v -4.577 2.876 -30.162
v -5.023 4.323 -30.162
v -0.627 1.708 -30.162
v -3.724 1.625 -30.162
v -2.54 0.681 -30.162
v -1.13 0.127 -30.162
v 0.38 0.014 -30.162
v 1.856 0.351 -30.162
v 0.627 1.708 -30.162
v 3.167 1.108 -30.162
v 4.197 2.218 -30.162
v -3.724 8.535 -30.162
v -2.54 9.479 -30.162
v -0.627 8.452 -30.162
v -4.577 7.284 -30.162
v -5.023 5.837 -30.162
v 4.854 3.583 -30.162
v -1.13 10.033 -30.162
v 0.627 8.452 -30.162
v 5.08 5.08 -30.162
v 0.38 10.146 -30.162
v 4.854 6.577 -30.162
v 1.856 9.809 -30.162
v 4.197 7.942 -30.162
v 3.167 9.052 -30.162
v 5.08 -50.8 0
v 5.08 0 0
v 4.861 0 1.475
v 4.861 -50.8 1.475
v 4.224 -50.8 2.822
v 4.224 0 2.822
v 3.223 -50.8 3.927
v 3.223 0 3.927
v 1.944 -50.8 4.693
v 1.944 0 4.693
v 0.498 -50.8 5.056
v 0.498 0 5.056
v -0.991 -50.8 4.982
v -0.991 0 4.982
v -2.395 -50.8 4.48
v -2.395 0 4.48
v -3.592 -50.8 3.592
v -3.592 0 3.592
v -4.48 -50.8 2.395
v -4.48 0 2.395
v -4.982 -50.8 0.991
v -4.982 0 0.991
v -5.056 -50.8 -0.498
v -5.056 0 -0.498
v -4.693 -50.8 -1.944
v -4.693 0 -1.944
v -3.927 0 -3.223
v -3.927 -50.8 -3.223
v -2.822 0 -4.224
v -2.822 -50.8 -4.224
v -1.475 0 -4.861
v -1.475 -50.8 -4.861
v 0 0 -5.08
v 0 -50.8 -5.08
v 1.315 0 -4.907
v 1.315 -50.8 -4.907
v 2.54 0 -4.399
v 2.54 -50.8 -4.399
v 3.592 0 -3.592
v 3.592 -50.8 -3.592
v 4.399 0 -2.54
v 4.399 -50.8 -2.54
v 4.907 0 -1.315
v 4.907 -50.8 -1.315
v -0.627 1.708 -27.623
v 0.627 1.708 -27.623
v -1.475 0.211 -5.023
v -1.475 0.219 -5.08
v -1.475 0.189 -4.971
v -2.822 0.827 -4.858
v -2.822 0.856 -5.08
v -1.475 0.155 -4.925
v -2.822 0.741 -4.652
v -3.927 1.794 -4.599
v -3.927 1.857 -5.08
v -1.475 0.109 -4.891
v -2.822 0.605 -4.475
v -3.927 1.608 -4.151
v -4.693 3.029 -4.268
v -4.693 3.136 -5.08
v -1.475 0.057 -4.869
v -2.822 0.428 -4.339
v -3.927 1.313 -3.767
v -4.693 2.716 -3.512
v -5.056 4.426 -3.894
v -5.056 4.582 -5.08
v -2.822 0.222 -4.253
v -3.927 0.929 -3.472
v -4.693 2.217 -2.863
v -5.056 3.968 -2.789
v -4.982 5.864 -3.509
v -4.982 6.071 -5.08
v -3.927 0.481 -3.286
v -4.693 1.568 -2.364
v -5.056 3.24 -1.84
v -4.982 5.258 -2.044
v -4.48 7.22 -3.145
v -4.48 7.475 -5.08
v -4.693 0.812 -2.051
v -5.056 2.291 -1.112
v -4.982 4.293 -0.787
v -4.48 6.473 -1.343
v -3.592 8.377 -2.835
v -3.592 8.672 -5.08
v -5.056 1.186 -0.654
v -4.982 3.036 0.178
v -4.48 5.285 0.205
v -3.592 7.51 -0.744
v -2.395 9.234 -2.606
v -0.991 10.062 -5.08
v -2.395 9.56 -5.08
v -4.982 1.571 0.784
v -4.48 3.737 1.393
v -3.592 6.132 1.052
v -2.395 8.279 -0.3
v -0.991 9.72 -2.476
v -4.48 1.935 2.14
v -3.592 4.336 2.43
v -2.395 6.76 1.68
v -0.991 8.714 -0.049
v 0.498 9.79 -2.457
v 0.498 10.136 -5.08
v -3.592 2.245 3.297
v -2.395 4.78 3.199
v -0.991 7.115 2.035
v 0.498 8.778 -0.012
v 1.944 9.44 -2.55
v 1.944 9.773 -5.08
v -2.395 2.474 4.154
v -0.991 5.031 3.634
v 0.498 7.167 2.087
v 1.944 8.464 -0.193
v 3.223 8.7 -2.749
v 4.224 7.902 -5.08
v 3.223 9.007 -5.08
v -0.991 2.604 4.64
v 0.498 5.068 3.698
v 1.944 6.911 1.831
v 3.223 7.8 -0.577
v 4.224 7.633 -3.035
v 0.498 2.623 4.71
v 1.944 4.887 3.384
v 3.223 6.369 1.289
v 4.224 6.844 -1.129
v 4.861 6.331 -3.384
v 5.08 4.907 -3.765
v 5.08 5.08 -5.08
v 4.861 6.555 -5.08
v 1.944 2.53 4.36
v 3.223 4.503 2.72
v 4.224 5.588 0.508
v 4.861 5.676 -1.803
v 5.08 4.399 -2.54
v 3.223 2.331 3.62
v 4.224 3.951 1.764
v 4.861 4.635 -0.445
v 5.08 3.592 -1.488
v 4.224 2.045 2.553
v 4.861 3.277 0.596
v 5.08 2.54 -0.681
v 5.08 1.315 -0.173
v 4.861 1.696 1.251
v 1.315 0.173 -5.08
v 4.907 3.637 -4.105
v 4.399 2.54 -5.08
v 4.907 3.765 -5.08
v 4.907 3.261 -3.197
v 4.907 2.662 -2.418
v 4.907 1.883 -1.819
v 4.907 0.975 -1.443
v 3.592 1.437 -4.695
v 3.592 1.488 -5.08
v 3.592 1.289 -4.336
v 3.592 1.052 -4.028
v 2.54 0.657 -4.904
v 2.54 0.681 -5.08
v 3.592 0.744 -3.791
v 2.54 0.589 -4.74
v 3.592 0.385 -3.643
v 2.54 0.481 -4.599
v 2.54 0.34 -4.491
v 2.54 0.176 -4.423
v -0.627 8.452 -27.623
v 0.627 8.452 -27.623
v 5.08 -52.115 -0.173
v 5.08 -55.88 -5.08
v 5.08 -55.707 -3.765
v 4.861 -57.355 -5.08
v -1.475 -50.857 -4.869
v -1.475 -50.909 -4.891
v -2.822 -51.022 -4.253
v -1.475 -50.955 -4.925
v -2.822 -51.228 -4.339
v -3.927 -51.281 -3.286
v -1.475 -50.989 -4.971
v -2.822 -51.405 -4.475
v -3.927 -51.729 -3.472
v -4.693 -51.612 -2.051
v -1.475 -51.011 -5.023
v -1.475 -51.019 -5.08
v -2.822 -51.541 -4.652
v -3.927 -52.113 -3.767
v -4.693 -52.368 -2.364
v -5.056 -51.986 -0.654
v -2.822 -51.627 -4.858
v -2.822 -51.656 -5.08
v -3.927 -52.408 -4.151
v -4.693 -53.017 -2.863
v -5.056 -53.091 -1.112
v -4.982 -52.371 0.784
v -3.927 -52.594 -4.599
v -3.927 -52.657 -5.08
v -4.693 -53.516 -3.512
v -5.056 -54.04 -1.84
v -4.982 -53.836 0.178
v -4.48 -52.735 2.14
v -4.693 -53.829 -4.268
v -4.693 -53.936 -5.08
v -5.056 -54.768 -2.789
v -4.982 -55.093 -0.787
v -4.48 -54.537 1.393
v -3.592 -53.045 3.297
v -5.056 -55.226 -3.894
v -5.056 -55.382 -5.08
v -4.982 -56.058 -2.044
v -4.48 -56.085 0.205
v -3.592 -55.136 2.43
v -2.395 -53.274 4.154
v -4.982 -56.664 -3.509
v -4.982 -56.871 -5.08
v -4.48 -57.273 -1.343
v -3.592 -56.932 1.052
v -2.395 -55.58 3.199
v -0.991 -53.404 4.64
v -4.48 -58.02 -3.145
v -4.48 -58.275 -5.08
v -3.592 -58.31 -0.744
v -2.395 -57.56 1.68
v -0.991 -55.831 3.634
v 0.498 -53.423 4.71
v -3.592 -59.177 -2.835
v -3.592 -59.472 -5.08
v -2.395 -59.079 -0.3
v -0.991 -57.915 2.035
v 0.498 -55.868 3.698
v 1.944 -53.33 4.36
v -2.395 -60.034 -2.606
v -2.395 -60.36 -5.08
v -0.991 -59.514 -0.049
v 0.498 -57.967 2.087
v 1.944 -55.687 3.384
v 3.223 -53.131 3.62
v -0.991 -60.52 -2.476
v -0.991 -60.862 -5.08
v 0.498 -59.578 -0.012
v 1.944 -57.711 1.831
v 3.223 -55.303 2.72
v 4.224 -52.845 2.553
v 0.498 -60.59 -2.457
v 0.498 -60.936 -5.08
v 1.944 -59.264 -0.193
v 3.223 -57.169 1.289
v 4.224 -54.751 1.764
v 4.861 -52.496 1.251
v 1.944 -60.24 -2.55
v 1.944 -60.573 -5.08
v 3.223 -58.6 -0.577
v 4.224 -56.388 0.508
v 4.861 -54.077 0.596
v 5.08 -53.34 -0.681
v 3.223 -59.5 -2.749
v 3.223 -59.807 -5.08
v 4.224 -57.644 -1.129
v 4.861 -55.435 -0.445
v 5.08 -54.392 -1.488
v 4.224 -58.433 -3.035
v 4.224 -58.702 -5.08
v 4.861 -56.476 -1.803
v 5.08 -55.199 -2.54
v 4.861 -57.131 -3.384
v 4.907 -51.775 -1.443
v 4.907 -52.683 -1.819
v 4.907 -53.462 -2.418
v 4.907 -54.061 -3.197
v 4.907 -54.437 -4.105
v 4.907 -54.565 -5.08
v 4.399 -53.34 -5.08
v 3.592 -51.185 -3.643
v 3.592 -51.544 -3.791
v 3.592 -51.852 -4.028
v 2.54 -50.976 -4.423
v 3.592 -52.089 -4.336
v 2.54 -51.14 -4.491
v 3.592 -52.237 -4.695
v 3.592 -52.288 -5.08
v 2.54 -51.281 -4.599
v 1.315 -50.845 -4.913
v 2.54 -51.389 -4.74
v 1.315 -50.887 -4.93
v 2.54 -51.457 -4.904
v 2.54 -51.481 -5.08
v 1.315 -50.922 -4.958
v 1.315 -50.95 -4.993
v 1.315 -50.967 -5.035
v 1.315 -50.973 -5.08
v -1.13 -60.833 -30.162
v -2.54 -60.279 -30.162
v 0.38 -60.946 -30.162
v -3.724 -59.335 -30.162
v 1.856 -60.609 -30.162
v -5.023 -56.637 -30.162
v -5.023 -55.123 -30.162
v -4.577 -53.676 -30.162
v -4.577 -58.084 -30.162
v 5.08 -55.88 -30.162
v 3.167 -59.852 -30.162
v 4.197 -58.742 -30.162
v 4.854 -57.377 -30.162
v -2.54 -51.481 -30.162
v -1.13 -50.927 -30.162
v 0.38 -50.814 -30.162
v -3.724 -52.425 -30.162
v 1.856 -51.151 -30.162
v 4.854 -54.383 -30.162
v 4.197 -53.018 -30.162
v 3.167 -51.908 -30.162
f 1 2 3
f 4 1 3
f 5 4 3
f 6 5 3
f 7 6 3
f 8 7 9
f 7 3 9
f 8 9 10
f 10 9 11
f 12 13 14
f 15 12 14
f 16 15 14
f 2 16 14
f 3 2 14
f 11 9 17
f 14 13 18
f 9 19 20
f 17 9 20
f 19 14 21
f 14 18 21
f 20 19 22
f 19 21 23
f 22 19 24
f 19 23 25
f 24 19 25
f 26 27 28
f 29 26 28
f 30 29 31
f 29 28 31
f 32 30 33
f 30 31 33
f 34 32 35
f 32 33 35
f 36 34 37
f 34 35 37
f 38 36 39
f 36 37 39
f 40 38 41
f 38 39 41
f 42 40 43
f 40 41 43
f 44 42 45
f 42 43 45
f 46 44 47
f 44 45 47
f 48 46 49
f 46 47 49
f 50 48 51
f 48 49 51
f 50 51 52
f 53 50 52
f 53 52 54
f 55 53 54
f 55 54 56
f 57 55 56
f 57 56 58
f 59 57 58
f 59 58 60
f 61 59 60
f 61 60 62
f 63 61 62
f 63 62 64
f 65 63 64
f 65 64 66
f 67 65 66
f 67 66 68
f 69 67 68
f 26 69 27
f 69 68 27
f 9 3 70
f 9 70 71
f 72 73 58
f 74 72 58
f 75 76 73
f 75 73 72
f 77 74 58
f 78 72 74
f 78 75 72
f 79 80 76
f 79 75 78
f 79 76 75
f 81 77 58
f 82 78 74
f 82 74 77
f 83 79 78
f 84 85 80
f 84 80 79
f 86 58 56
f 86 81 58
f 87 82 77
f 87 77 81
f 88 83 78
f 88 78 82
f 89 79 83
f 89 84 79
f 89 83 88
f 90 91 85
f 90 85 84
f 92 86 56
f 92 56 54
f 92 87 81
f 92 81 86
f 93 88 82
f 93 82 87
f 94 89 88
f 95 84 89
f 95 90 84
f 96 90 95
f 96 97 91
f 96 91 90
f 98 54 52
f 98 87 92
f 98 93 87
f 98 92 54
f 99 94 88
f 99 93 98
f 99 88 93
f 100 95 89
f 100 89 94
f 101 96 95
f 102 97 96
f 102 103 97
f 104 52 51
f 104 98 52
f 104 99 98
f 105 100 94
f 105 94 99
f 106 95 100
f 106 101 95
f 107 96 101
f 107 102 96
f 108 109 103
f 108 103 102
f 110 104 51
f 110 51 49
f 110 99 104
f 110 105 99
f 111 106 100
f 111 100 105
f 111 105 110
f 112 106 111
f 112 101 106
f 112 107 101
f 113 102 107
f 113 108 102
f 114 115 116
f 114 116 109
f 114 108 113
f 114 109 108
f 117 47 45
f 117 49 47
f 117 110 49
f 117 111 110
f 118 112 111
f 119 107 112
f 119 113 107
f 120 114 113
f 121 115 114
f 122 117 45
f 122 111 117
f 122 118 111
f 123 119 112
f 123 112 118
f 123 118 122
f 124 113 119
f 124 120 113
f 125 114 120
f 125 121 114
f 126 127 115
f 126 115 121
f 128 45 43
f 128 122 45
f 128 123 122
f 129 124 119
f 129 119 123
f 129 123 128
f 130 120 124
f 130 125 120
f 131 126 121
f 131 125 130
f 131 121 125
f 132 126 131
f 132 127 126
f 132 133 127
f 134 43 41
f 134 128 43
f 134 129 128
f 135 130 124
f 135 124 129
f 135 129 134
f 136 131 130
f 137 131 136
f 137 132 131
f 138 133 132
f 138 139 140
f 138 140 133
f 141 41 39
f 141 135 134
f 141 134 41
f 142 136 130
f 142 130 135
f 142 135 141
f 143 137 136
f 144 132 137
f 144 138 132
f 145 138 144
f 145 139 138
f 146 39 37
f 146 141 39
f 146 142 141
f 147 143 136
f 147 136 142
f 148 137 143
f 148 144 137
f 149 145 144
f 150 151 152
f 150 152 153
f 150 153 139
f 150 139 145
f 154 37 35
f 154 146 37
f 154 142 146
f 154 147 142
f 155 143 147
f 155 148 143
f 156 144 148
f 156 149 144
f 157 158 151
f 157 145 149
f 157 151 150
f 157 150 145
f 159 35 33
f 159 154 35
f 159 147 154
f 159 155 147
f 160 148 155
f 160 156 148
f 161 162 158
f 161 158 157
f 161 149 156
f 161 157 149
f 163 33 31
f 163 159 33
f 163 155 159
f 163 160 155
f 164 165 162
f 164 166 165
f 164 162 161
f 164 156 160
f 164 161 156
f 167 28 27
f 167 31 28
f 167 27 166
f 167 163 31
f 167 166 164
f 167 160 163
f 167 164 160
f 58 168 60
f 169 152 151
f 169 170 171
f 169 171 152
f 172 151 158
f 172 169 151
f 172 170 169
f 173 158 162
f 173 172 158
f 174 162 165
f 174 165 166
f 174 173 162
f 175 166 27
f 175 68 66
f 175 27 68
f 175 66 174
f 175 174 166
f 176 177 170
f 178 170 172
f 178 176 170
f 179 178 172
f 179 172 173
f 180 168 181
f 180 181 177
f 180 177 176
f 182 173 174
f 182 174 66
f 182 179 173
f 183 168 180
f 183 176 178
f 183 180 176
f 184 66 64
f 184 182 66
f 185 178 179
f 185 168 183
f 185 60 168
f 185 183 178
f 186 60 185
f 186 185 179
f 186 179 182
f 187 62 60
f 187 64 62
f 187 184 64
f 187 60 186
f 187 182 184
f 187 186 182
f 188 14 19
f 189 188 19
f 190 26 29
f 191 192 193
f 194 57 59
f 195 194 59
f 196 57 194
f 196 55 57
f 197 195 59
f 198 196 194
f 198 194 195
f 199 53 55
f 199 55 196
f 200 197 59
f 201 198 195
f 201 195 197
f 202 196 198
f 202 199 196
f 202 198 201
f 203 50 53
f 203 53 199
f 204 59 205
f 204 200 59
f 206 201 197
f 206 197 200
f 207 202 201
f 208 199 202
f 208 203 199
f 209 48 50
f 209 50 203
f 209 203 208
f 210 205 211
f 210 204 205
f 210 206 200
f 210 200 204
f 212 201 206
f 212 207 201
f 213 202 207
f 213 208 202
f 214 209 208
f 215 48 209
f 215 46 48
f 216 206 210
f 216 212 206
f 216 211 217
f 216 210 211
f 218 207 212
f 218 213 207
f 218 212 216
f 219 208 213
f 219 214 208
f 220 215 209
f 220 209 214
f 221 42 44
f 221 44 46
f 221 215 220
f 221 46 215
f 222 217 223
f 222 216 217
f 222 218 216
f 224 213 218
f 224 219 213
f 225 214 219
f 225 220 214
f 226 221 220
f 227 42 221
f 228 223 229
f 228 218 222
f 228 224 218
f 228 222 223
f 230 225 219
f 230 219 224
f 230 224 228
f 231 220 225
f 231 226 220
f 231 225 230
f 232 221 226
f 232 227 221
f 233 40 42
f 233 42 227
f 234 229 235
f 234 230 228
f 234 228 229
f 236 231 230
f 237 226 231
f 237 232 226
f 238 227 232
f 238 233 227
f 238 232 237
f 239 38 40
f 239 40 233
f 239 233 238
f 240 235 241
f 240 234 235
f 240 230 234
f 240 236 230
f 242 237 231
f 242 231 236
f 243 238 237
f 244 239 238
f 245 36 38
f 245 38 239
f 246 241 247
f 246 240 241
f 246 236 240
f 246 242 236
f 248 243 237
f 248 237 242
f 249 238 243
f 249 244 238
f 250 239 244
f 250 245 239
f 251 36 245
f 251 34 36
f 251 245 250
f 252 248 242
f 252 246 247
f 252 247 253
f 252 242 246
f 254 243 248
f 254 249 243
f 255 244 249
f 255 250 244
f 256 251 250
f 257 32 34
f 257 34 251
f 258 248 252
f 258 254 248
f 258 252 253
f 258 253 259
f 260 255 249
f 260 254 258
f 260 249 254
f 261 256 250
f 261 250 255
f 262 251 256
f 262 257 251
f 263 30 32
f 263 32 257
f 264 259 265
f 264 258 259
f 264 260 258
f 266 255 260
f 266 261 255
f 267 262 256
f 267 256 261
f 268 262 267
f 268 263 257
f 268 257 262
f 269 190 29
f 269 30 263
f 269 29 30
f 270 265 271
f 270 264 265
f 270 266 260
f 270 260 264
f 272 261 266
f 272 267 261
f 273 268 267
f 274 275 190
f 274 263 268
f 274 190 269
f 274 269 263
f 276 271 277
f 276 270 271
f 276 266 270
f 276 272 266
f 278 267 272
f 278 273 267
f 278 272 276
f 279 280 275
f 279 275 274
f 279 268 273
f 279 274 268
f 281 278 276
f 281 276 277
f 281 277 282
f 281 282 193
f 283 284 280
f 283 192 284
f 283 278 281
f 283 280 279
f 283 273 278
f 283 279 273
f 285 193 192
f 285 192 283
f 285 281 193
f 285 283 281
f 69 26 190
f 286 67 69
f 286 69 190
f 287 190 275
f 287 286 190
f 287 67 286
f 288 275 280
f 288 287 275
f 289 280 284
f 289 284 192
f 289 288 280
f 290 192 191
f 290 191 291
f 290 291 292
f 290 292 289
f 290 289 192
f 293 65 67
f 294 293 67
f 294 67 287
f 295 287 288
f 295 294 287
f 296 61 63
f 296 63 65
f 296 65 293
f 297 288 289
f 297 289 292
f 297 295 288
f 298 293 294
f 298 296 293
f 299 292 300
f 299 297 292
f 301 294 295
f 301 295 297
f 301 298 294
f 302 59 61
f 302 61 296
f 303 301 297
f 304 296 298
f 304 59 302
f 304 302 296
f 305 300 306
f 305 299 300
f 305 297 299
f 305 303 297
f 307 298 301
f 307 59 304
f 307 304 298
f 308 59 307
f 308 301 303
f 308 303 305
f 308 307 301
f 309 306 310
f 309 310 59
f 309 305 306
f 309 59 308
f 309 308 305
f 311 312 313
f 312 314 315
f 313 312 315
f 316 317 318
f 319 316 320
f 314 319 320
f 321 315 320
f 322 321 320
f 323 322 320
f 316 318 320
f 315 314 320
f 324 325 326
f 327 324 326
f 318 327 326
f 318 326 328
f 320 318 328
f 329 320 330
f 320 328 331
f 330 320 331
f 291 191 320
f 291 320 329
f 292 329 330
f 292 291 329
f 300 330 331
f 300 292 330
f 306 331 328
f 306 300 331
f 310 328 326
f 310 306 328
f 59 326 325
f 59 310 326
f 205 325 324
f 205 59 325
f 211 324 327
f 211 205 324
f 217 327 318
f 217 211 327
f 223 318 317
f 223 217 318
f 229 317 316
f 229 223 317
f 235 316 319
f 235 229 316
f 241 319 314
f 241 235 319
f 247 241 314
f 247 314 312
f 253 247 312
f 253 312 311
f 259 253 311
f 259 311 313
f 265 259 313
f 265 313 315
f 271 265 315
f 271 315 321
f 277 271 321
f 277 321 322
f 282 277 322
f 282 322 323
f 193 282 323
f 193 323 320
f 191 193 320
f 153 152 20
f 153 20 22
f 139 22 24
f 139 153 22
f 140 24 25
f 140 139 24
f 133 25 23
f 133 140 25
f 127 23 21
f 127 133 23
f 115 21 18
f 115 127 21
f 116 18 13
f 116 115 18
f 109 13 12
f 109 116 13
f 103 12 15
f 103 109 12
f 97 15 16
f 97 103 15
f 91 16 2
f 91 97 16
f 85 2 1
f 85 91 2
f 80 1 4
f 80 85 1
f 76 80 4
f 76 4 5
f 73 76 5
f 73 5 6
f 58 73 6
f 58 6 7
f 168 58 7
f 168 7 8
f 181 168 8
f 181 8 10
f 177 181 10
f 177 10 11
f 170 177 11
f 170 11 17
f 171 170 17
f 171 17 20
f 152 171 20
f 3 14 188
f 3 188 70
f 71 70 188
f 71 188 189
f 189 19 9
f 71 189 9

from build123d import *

# Parameters (mm, degrees)
F0_R     = 5.08
F1_DEPTH = 50.8
F3_R     = 5.08
F4_DEPTH = 25.0825
F8_W     = 1.2546490179
F8_H     = 6.7444416398
F9_DEPTH = 2.54


with BuildPart() as f1:
    # F0 (on Front) → F1 (new body)
    with BuildSketch(Plane.XZ):
        Circle(F0_R)
    extrude(amount=F1_DEPTH)

    # F3 (on offset) → F4 (join)
    with BuildSketch(Plane.XY.offset(-5.08)):
        with Locations((0, -55.88)):
            Circle(F3_R)
        with Locations((0, 5.08)):
            Circle(F3_R)
    extrude(amount=-F4_DEPTH)

    # F6: sweep along a path in F5
    with BuildLine(Plane.YZ) as f6_path:
        ThreePointArc((5.08, -5.08), (3.5921024484, -1.4878975516), (0, 0))
    # F1_face (on face) → F6 (sweep)
    with BuildSketch(Plane(origin=(0, 0, 0), x_dir=(1, 0, 0), z_dir=(0, 1, 0))):
        with BuildLine():
            ThreePointArc((5.4e-09, 5.08), (-3.5921024504, -3.5921024465), (5.08, 0))
            ThreePointArc((5.08, 0), (3.5921024504, 3.5921024465), (5.4e-09, 5.08))
        make_face()
    sweep(path=f6_path.line)

    # F7: sweep along a path in F5
    with BuildLine(Plane.YZ) as f7_path:
        ThreePointArc((-50.8, 0), (-54.3921024484, -1.4878975516), (-55.88, -5.08))
    # F1_face1 (on face) → F7 (sweep)
    with BuildSketch(Plane.XZ.offset(50.8)):
        with BuildLine():
            ThreePointArc((5.08, 0), (-3.5921024472, 3.5921024497), (-3.5e-09, -5.08))
            ThreePointArc((-3.5e-09, -5.08), (3.5921024472, -3.5921024497), (5.08, 0))
        make_face()
    sweep(path=f7_path.line)

    # F8 (on face) → F9 (cut)
    with BuildSketch(Plane(origin=(0, 0, -30.1625), x_dir=(1, 0, 0), z_dir=(0, 0, -1))):
        with Locations((0, -5.08)):
            Rectangle(F8_W, F8_H)
    extrude(amount=-F9_DEPTH, mode=Mode.SUBTRACT)


solid = f1.part
